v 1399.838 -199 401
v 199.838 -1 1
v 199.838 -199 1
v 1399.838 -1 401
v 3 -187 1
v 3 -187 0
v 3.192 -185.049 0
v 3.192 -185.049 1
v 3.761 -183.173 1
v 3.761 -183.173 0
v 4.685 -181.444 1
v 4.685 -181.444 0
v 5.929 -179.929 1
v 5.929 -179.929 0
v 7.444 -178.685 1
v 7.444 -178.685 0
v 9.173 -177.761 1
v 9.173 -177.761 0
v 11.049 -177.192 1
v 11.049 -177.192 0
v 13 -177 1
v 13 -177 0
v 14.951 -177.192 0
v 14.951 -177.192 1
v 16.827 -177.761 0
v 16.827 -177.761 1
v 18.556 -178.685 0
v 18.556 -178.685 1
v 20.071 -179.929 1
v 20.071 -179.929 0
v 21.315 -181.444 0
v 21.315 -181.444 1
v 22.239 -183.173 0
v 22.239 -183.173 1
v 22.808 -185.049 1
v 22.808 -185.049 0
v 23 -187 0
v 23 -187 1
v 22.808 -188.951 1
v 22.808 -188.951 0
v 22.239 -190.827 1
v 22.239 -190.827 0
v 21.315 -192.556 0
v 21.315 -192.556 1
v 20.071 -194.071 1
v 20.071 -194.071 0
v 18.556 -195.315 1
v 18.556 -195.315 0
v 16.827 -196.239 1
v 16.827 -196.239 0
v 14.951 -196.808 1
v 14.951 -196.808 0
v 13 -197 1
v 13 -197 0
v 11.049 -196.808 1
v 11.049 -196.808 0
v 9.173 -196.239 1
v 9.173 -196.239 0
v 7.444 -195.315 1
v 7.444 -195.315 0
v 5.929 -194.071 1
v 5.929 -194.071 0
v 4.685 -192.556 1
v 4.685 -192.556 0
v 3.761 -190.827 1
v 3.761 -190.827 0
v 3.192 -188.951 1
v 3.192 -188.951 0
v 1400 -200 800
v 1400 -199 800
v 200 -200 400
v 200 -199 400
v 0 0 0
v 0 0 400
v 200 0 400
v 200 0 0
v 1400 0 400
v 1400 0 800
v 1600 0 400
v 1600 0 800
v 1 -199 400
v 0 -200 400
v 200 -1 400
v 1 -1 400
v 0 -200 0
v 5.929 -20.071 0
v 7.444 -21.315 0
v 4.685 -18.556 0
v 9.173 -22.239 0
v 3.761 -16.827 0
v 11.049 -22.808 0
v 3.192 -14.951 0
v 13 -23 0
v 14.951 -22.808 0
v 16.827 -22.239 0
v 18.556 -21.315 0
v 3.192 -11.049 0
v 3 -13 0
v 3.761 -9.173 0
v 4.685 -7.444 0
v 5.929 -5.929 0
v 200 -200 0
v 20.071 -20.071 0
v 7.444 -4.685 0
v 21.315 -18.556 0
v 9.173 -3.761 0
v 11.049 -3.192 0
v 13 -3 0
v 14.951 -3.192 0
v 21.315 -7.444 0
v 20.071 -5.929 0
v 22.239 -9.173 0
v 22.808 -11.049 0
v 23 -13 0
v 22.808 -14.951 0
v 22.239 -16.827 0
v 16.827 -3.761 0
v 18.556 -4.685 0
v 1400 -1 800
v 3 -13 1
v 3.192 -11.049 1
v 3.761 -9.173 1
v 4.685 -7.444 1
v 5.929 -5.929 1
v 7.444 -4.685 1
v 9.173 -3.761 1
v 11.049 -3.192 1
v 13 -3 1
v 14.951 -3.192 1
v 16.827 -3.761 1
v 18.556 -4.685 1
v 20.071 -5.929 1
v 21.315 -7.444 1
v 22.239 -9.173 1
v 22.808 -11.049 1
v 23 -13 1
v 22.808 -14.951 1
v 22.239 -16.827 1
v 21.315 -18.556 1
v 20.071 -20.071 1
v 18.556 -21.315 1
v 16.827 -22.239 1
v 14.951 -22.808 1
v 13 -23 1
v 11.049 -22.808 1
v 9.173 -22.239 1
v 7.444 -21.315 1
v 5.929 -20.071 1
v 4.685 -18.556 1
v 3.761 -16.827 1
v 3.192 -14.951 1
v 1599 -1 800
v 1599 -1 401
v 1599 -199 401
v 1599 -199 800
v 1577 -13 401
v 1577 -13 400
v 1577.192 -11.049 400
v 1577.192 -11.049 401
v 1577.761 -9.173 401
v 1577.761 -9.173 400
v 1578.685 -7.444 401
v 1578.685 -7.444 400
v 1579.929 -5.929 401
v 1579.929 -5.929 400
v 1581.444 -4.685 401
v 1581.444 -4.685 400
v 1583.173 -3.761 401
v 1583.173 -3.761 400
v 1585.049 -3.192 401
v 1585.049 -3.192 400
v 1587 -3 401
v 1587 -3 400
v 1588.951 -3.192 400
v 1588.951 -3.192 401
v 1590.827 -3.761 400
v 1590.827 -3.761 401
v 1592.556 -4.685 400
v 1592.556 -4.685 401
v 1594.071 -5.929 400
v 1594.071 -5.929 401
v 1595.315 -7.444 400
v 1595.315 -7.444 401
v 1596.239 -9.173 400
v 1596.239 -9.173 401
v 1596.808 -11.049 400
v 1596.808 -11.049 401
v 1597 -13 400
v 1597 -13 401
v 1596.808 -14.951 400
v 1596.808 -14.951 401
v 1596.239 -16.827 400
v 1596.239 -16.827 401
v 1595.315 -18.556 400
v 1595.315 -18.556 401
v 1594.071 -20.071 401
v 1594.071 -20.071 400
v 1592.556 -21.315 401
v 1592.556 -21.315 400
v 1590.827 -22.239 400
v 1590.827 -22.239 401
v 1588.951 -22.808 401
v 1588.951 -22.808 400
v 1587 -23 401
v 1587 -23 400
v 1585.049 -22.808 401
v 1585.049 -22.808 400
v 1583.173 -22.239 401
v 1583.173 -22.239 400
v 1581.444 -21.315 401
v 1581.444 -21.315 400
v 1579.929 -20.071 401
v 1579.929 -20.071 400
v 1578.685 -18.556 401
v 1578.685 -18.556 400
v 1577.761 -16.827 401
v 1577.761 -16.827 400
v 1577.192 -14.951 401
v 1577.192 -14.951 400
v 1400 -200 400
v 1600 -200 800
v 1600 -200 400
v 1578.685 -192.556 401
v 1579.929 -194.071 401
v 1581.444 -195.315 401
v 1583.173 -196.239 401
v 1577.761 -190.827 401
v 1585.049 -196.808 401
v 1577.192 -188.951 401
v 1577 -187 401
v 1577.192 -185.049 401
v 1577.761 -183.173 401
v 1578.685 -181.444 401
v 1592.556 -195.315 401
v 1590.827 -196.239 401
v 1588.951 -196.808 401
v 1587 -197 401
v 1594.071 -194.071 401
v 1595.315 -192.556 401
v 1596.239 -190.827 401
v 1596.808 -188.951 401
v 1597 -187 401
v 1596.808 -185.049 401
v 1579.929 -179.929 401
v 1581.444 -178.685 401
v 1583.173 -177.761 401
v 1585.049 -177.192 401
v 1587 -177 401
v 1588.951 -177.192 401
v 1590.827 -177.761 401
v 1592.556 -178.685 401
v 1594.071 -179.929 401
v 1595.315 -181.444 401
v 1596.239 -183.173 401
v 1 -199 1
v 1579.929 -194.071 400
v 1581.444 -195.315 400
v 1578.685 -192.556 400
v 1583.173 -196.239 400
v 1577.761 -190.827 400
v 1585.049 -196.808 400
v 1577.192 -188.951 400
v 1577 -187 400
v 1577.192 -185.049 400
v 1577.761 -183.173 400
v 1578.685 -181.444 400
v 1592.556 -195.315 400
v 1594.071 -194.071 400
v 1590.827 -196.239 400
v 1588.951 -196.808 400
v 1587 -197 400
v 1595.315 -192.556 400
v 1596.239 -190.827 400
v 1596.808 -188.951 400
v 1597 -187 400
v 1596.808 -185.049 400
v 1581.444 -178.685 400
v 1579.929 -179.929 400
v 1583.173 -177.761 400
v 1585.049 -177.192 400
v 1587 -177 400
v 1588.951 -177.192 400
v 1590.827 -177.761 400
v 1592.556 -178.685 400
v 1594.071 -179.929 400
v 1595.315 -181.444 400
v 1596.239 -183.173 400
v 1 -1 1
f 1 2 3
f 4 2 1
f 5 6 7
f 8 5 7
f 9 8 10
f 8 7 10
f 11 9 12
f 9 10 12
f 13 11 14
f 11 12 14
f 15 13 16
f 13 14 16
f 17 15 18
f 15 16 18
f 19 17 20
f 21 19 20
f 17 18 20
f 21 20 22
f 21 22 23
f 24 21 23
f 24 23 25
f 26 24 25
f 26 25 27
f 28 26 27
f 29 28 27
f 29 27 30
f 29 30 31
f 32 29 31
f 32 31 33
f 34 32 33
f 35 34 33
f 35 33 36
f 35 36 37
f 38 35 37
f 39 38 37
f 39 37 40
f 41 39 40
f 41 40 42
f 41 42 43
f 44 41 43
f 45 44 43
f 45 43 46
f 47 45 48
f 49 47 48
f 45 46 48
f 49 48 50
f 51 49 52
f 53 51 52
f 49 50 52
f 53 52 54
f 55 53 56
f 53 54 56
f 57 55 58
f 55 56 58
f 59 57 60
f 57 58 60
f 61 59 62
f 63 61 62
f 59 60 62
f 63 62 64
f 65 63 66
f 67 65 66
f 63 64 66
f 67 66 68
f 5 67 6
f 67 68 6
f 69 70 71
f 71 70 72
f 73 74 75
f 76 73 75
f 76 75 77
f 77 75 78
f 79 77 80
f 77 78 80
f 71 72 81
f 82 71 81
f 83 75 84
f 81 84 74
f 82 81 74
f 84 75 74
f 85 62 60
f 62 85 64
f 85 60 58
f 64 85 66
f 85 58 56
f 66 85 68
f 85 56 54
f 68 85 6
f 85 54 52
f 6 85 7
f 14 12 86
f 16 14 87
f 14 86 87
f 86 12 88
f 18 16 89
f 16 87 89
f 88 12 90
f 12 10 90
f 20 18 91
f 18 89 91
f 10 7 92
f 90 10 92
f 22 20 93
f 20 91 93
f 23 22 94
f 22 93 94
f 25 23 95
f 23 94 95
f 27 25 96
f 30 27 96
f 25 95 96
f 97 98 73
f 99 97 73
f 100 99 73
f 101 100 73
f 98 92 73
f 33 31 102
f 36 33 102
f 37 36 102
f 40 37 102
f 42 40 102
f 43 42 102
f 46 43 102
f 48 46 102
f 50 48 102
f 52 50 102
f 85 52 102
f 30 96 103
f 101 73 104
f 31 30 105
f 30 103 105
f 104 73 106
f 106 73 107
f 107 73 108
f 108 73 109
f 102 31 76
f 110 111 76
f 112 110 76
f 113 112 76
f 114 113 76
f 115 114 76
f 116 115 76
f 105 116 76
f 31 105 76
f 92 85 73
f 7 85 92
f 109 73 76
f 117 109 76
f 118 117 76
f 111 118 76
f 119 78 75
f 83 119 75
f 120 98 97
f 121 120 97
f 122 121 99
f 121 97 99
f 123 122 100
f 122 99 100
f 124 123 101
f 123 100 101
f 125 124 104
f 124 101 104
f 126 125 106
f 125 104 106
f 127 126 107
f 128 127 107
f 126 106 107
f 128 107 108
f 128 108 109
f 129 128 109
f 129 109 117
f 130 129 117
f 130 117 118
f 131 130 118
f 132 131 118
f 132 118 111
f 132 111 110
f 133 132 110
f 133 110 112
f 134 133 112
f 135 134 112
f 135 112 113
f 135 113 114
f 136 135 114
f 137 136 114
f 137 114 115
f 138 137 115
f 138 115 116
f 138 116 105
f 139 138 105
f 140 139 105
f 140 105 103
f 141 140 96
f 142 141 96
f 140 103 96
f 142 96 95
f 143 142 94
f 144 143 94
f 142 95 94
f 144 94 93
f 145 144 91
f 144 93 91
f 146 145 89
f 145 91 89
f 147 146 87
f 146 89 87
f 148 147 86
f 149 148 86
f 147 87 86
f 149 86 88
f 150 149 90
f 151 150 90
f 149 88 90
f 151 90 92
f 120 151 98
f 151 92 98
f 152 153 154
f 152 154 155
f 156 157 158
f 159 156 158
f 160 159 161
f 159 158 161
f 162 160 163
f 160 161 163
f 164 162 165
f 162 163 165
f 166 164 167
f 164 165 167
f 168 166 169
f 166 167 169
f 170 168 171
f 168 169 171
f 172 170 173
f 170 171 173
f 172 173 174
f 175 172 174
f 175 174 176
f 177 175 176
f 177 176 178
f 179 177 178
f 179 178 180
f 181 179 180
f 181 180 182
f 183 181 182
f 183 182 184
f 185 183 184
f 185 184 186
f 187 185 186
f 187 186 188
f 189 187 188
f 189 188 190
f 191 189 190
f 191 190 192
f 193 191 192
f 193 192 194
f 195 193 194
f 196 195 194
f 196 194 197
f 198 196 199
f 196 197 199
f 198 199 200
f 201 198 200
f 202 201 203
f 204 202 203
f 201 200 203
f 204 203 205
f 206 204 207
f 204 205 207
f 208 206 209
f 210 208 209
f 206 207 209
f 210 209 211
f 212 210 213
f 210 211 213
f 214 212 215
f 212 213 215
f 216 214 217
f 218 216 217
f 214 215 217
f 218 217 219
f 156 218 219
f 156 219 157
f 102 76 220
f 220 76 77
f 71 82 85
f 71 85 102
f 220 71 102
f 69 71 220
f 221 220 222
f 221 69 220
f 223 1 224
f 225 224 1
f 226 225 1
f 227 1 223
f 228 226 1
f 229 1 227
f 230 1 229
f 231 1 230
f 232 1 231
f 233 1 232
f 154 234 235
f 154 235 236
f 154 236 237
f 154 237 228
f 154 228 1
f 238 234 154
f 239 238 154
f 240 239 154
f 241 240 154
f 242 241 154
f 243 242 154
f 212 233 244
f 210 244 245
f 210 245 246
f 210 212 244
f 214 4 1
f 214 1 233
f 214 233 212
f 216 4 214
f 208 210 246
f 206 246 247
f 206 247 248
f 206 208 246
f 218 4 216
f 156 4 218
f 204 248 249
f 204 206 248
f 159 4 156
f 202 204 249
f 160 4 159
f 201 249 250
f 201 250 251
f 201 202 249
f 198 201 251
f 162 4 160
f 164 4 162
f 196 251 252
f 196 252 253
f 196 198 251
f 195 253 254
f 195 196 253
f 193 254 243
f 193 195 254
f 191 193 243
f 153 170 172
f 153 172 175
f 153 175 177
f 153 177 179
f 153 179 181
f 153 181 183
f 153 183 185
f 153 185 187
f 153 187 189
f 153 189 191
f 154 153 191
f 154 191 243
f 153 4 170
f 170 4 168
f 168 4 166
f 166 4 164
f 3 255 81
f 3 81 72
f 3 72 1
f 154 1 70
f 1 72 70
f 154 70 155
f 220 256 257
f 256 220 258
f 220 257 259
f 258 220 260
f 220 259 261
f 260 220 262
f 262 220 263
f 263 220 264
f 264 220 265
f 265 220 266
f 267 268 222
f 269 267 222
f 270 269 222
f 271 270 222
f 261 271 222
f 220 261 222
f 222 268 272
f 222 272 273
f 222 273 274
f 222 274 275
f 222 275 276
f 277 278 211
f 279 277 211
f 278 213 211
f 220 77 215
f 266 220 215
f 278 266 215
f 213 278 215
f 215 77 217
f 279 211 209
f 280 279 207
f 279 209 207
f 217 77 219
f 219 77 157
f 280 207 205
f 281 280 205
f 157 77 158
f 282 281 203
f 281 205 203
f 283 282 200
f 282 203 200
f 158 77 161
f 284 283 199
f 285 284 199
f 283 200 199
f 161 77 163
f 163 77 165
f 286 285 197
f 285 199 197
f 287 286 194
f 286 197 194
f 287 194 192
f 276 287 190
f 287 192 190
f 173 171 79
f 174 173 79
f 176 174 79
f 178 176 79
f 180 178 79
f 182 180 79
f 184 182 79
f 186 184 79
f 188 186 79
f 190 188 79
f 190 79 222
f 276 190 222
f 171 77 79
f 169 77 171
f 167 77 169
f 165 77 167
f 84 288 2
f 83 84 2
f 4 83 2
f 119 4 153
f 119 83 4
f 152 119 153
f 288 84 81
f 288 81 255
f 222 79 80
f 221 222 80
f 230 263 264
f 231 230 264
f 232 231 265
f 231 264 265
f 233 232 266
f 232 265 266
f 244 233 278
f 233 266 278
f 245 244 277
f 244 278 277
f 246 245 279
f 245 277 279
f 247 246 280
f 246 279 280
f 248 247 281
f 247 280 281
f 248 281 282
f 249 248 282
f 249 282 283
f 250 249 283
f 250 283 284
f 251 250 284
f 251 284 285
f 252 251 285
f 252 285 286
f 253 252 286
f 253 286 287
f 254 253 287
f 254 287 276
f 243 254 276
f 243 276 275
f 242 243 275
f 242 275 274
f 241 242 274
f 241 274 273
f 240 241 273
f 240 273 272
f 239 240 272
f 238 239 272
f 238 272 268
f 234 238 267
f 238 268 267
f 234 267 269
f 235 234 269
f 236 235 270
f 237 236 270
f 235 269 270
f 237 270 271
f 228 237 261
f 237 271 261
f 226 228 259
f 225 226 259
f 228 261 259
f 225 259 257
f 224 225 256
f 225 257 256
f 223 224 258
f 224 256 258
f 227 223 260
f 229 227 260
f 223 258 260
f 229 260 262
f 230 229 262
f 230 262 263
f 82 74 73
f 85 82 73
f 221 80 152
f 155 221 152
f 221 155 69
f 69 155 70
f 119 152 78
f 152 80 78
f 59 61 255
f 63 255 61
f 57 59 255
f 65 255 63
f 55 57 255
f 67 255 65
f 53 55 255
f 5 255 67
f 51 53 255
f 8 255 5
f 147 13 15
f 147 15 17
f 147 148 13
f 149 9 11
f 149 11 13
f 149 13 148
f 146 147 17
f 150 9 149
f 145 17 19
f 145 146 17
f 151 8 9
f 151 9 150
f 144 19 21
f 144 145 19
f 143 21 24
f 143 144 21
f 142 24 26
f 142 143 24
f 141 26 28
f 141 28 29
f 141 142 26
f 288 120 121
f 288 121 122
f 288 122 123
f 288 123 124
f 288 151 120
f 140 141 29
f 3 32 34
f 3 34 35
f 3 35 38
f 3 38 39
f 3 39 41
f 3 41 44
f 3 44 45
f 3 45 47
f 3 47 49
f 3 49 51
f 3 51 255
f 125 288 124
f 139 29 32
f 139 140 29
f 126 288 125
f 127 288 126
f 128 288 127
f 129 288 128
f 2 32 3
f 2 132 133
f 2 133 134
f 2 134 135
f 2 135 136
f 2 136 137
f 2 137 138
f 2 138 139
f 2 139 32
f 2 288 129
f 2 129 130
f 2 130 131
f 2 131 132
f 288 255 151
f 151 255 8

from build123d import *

# Parameters (mm, degrees)
F1_DEPTH = 200
F2_T     = -1
F6_D     = 20
F7_D     = 20


# Not quite as in the source:
# - the program builds the solid bodies; features that only make, move or delete a surface that nothing else refers to are left out


with BuildPart() as f1:
    # F0 (on Front) → F1 (new body)
    with BuildSketch(Plane.XZ):
        Polygon((0, 400), (0, 0), (200, 0), (1400, 400), (1600, 400), (1600, 800), (1400, 800), (200, 400), align=None)
    extrude(amount=F1_DEPTH)

    # F2
    f2_openings = [f1.faces().sort_by_distance(p)[0] for p in [
        (100, -100, 400),
        (1500, -100, 800),
        (800, -100, 600),
    ]]
    offset(amount=F2_T, openings=f2_openings, kind=Kind.INTERSECTION)

    # F6 (through all)
    with Locations(Plane.XY.offset(401)):
        with Locations((13, -187), (13, -13)):
            Hole(F6_D / 2)

    # F7 (through all)
    with Locations(Plane.XY.offset(401)):
        with Locations((1587, -13), (1587, -187)):
            Hole(F7_D / 2)


solid = f1.part
